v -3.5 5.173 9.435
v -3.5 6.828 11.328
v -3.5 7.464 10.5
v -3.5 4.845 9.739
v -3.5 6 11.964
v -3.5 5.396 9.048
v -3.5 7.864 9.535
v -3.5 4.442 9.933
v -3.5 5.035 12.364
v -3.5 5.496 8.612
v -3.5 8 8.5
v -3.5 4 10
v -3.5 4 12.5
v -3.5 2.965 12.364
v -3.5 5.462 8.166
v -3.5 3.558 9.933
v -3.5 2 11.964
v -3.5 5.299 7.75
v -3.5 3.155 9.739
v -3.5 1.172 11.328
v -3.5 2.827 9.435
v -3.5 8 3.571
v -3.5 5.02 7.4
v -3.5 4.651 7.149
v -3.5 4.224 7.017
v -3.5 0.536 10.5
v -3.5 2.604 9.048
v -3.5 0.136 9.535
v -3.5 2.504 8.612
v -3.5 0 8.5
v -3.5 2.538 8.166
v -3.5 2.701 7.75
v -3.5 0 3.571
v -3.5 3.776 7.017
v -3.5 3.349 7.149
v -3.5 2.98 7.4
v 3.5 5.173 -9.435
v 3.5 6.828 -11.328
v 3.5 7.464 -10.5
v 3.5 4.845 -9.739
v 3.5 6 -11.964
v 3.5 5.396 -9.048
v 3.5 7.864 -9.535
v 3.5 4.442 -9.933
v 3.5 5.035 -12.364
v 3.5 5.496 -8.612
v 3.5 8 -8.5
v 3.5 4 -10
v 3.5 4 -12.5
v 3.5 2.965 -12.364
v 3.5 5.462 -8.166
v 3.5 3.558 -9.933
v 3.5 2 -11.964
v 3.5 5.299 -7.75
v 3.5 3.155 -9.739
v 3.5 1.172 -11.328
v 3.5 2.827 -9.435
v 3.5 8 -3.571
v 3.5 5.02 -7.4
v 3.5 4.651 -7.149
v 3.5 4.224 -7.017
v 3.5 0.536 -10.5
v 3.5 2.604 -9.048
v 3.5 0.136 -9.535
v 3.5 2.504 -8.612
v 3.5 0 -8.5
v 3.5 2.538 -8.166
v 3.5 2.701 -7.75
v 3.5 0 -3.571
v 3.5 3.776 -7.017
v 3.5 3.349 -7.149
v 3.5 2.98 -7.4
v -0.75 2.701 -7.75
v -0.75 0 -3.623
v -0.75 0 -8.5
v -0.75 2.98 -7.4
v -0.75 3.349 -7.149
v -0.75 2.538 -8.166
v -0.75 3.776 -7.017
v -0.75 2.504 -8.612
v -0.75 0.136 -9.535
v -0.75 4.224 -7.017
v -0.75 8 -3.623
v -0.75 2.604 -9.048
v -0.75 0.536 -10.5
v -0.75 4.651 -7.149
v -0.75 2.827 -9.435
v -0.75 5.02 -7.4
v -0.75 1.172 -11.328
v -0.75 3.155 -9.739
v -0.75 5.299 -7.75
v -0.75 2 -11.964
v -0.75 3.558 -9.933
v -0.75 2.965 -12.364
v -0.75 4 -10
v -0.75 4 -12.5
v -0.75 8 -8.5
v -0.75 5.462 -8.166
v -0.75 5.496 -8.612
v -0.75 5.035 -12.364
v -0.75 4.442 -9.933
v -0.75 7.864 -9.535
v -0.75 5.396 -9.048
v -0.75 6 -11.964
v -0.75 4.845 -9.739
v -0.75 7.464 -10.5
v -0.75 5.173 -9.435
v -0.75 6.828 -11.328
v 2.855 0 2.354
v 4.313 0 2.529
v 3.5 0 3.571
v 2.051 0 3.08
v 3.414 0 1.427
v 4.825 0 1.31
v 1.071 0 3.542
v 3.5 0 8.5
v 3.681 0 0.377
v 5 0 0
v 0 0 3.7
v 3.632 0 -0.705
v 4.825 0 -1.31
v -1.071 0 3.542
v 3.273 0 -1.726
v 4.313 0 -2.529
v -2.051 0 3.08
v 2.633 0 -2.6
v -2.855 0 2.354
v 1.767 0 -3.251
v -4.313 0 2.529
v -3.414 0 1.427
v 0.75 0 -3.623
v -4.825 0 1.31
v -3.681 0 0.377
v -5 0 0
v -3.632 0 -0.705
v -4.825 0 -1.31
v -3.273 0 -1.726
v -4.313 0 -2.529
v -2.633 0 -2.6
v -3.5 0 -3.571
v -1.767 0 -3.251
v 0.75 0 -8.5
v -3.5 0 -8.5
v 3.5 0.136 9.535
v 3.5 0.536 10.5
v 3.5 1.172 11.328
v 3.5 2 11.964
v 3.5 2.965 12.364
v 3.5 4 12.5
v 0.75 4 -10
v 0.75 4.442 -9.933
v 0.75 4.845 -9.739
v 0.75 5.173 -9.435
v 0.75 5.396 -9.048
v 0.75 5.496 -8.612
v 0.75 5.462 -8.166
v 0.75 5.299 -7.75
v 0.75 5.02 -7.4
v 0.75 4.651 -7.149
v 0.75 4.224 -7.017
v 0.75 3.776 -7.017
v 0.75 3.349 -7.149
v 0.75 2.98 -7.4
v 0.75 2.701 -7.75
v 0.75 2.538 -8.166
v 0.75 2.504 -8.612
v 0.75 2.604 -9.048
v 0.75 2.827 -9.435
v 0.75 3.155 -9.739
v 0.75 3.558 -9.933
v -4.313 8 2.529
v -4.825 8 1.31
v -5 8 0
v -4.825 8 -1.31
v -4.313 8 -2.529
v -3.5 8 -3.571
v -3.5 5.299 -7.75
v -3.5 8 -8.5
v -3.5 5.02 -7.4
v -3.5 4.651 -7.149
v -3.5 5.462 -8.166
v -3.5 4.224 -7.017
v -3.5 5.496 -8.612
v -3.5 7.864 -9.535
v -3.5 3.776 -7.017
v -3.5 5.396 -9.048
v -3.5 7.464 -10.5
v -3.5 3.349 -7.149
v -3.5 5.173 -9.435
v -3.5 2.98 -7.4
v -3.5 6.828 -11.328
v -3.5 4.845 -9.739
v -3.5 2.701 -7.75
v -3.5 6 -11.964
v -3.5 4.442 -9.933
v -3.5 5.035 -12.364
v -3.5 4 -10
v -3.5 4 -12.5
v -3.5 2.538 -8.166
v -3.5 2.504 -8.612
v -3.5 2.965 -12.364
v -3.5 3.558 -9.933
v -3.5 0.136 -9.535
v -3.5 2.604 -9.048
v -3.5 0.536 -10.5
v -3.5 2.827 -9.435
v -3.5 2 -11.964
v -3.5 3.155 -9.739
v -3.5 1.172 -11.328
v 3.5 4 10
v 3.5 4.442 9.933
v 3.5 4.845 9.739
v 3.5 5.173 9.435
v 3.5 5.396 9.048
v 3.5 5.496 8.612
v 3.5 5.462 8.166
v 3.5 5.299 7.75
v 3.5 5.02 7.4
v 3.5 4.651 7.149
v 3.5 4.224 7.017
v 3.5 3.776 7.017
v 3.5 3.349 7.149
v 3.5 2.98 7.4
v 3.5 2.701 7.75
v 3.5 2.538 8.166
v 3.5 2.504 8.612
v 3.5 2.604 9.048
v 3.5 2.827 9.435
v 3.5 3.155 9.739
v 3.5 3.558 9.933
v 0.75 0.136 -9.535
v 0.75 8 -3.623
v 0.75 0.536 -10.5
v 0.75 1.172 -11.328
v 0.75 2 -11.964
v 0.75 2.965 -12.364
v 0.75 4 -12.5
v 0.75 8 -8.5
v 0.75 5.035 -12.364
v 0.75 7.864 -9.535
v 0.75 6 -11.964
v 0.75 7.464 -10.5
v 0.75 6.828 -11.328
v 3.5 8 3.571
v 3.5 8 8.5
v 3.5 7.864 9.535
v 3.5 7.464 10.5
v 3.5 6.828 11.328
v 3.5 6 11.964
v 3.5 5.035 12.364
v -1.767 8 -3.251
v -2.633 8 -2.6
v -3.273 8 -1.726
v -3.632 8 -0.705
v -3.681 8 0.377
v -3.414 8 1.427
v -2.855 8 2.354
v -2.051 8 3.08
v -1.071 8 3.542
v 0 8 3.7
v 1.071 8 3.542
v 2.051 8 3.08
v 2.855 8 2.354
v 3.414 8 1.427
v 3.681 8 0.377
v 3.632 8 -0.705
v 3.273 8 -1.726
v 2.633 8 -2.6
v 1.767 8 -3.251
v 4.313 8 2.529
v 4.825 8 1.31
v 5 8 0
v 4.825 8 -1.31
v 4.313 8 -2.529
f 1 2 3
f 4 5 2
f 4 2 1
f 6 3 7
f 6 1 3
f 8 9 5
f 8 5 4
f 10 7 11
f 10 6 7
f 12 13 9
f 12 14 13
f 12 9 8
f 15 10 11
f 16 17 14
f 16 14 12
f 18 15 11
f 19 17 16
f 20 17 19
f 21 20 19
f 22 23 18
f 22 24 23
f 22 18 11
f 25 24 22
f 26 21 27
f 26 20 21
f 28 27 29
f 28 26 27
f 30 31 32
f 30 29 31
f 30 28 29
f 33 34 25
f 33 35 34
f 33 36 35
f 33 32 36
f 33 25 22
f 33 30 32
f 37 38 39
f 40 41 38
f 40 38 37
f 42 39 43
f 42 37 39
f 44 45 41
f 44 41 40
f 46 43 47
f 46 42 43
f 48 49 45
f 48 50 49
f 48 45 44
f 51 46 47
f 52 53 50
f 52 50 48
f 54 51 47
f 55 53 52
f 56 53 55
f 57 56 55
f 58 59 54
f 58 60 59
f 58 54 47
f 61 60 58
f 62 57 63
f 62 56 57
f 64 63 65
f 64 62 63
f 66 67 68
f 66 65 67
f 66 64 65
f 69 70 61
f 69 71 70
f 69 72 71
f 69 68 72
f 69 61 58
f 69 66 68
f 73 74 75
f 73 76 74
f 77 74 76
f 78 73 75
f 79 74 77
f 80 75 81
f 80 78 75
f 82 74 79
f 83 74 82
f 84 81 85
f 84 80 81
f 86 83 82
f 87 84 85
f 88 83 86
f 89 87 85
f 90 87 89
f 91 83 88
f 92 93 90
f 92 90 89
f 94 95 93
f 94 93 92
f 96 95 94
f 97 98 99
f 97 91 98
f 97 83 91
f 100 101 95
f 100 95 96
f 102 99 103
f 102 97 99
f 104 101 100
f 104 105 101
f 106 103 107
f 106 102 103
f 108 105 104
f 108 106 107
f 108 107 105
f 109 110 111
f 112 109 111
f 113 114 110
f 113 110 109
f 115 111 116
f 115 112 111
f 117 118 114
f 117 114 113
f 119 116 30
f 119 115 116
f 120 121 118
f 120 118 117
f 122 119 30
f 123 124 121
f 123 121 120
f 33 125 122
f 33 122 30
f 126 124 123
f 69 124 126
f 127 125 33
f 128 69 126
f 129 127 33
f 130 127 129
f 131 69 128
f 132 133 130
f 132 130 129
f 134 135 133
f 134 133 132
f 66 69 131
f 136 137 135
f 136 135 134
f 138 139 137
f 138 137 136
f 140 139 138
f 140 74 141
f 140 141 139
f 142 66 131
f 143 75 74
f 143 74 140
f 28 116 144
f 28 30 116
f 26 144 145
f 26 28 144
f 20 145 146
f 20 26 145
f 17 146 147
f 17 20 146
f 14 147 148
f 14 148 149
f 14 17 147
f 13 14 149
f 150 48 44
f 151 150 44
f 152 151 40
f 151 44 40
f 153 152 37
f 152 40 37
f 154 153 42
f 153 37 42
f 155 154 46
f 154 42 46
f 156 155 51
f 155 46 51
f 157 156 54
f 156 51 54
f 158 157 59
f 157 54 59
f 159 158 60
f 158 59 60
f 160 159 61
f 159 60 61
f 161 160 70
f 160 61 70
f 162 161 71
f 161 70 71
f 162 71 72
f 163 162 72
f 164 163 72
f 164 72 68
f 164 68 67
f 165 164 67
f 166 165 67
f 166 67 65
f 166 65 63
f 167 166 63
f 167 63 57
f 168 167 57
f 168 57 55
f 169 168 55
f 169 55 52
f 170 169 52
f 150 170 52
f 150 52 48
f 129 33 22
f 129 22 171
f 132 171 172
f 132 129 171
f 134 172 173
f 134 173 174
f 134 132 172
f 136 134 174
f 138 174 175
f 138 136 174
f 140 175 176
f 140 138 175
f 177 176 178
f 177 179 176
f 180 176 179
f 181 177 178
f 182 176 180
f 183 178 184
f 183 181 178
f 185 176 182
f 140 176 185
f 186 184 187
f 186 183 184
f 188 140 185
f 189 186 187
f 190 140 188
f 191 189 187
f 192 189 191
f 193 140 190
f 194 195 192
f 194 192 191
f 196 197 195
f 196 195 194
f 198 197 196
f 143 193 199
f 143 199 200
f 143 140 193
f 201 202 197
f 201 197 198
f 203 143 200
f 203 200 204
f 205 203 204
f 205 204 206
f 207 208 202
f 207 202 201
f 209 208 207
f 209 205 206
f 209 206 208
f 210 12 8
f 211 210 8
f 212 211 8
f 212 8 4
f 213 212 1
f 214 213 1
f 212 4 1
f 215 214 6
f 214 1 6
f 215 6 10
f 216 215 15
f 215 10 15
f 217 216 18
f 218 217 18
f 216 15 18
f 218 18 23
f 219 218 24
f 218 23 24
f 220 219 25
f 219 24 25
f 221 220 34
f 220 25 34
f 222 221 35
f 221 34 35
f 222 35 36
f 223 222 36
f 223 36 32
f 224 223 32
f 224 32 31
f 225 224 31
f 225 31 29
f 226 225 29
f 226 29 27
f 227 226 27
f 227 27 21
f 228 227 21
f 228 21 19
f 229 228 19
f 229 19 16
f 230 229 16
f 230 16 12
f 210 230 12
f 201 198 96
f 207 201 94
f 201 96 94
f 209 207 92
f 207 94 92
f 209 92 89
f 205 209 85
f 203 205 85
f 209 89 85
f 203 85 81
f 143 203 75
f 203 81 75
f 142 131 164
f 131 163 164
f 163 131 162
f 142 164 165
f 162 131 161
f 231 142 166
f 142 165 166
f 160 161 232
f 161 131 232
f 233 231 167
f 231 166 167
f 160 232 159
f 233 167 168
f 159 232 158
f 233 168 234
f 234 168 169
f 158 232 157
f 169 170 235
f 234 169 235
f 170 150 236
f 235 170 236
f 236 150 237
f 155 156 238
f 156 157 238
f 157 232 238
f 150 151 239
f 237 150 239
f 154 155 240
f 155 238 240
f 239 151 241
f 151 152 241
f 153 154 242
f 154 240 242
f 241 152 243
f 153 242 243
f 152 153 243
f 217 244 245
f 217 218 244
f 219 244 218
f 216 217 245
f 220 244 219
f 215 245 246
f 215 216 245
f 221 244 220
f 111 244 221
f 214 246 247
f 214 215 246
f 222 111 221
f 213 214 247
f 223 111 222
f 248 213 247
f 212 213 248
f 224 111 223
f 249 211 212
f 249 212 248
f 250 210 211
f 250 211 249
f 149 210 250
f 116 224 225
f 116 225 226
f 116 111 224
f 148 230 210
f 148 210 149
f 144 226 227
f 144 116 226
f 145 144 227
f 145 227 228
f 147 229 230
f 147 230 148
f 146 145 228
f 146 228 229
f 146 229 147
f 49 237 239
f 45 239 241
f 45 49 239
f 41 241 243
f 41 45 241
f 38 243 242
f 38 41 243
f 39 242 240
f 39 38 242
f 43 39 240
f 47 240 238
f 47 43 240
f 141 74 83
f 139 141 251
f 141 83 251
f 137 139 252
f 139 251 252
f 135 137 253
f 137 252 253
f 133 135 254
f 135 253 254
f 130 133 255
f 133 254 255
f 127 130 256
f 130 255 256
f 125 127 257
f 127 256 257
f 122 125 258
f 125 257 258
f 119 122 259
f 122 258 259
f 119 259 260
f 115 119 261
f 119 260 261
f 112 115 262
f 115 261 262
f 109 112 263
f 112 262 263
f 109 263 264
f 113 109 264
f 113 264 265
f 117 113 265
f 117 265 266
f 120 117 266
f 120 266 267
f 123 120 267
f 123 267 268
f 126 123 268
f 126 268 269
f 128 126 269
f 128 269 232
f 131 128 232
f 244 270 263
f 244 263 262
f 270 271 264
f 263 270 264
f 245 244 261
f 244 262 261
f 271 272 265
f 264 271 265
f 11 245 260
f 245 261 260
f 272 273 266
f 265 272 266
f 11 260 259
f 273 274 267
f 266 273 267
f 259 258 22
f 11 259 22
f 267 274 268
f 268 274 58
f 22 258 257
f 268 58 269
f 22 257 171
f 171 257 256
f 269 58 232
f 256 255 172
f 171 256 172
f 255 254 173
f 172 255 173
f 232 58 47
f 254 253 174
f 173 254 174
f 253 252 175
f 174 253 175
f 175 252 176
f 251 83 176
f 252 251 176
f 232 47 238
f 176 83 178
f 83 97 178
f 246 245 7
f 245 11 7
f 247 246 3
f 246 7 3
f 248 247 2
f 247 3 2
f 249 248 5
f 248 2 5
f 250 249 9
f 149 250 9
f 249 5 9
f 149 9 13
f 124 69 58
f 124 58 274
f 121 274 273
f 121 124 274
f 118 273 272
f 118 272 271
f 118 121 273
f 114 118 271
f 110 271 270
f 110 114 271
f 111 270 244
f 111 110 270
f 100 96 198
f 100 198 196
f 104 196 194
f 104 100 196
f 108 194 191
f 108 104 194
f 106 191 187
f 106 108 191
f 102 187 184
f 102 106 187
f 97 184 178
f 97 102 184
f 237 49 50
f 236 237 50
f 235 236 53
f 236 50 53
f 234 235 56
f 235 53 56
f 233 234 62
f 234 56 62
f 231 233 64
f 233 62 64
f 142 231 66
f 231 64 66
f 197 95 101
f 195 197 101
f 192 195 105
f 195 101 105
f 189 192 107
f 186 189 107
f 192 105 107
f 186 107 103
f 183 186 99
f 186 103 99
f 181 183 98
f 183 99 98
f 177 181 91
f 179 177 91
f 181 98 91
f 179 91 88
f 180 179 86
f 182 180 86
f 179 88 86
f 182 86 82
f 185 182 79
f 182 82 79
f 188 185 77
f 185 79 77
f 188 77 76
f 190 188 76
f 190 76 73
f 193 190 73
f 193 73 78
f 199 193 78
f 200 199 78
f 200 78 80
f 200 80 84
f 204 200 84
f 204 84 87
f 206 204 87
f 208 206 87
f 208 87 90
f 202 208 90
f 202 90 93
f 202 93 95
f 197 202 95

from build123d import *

# Parameters (mm, degrees)
EXTRUDE_2_DEPTH     = 8
FILLET_1_R          = 4
SKETCH_5_R          = 1.5
CUT_EXTRUDE_1_DEPTH = 18.102631376
SKETCH_3_R          = 3.7
CUT_EXTRUDE_2_DEPTH = 16.660459763
FILLET_3_R          = 4
SKETCH_6_R          = 1.5
CUT_EXTRUDE_3_DEPTH = 18.102631376
SKETCH_7_W          = 1.5
SKETCH_7_H          = 11.105726975
CUT_EXTRUDE_5_DEPTH = 10


with BuildPart() as part:
    # 草图1 → 凸台-拉伸2 (new body)
    with BuildSketch(Plane(origin=(0, 0, 0), x_dir=(1, 0, 0), z_dir=(0, 1, 0))):
        with BuildLine():
            Line((-3.5, 3.570714214), (-3.5, 12.5))
            Line((-3.5, 12.5), (3.5, 12.5))
            Line((3.5, 12.5), (3.5, 3.570714214))
            ThreePointArc((3.5, 3.570714214), (5, 0), (3.5, -3.570714214))
            Line((3.5, -3.570714214), (3.5, -12.5))
            Line((3.5, -12.5), (-3.5, -12.5))
            Line((-3.5, -12.5), (-3.5, -3.570714214))
            ThreePointArc((-3.5, -3.570714214), (-5, 0), (-3.5, 3.570714214))
        make_face()
    extrude(amount=EXTRUDE_2_DEPTH)

    # 圆角1
    fillet_1_edges = [part.edges().sort_by_distance(p)[0] for p in [
        (0, 0, -12.5),
        (0, 8, -12.5),
    ]]
    fillet(fillet_1_edges, radius=FILLET_1_R - 0.0001)  # a hair under: the kernel refuses the full size

    # 草图5 → 切除-拉伸1 (cut, through all)
    with BuildSketch(Plane(origin=(3.5, 0, 0), x_dir=(0, 0, -1), z_dir=(1, 0, 0))):
        with Locations((8.5, 4)):
            Circle(SKETCH_5_R)
    extrude(amount=-CUT_EXTRUDE_1_DEPTH, mode=Mode.SUBTRACT)

    # 草图3 → 切除-拉伸2 (cut, through all)
    with BuildSketch(Plane(origin=(0, 8, 0), x_dir=(1, 0, 0), z_dir=(0, 1, 0))):
        with Locations(Location((0, 0, 0), (0, 0, 270))):
            Circle(SKETCH_3_R)
    extrude(amount=-CUT_EXTRUDE_2_DEPTH, mode=Mode.SUBTRACT)

    # 圆角3
    fillet_3_edges = [part.edges().sort_by_distance(p)[0] for p in [
        (0, 8, 12.5),
        (0, 0, 12.5),
    ]]
    fillet(fillet_3_edges, radius=FILLET_3_R - 0.0001)  # a hair under: the kernel refuses the full size

    # 草图6 → 切除-拉伸3 (cut, through all)
    with BuildSketch(Plane.ZY.offset(3.5)):
        with Locations((8.5, 4)):
            Circle(SKETCH_6_R)
    extrude(amount=-CUT_EXTRUDE_3_DEPTH, mode=Mode.SUBTRACT)

    # 草图7 → 切除-拉伸5 (cut)
    with BuildSketch(Plane(origin=(0, 8, 0), x_dir=(1, 0, 0), z_dir=(0, 1, 0))):
        with Locations((0, 9.052863488)):
            Rectangle(SKETCH_7_W, SKETCH_7_H)
    extrude(amount=-CUT_EXTRUDE_5_DEPTH, mode=Mode.SUBTRACT)


solid = part.part
